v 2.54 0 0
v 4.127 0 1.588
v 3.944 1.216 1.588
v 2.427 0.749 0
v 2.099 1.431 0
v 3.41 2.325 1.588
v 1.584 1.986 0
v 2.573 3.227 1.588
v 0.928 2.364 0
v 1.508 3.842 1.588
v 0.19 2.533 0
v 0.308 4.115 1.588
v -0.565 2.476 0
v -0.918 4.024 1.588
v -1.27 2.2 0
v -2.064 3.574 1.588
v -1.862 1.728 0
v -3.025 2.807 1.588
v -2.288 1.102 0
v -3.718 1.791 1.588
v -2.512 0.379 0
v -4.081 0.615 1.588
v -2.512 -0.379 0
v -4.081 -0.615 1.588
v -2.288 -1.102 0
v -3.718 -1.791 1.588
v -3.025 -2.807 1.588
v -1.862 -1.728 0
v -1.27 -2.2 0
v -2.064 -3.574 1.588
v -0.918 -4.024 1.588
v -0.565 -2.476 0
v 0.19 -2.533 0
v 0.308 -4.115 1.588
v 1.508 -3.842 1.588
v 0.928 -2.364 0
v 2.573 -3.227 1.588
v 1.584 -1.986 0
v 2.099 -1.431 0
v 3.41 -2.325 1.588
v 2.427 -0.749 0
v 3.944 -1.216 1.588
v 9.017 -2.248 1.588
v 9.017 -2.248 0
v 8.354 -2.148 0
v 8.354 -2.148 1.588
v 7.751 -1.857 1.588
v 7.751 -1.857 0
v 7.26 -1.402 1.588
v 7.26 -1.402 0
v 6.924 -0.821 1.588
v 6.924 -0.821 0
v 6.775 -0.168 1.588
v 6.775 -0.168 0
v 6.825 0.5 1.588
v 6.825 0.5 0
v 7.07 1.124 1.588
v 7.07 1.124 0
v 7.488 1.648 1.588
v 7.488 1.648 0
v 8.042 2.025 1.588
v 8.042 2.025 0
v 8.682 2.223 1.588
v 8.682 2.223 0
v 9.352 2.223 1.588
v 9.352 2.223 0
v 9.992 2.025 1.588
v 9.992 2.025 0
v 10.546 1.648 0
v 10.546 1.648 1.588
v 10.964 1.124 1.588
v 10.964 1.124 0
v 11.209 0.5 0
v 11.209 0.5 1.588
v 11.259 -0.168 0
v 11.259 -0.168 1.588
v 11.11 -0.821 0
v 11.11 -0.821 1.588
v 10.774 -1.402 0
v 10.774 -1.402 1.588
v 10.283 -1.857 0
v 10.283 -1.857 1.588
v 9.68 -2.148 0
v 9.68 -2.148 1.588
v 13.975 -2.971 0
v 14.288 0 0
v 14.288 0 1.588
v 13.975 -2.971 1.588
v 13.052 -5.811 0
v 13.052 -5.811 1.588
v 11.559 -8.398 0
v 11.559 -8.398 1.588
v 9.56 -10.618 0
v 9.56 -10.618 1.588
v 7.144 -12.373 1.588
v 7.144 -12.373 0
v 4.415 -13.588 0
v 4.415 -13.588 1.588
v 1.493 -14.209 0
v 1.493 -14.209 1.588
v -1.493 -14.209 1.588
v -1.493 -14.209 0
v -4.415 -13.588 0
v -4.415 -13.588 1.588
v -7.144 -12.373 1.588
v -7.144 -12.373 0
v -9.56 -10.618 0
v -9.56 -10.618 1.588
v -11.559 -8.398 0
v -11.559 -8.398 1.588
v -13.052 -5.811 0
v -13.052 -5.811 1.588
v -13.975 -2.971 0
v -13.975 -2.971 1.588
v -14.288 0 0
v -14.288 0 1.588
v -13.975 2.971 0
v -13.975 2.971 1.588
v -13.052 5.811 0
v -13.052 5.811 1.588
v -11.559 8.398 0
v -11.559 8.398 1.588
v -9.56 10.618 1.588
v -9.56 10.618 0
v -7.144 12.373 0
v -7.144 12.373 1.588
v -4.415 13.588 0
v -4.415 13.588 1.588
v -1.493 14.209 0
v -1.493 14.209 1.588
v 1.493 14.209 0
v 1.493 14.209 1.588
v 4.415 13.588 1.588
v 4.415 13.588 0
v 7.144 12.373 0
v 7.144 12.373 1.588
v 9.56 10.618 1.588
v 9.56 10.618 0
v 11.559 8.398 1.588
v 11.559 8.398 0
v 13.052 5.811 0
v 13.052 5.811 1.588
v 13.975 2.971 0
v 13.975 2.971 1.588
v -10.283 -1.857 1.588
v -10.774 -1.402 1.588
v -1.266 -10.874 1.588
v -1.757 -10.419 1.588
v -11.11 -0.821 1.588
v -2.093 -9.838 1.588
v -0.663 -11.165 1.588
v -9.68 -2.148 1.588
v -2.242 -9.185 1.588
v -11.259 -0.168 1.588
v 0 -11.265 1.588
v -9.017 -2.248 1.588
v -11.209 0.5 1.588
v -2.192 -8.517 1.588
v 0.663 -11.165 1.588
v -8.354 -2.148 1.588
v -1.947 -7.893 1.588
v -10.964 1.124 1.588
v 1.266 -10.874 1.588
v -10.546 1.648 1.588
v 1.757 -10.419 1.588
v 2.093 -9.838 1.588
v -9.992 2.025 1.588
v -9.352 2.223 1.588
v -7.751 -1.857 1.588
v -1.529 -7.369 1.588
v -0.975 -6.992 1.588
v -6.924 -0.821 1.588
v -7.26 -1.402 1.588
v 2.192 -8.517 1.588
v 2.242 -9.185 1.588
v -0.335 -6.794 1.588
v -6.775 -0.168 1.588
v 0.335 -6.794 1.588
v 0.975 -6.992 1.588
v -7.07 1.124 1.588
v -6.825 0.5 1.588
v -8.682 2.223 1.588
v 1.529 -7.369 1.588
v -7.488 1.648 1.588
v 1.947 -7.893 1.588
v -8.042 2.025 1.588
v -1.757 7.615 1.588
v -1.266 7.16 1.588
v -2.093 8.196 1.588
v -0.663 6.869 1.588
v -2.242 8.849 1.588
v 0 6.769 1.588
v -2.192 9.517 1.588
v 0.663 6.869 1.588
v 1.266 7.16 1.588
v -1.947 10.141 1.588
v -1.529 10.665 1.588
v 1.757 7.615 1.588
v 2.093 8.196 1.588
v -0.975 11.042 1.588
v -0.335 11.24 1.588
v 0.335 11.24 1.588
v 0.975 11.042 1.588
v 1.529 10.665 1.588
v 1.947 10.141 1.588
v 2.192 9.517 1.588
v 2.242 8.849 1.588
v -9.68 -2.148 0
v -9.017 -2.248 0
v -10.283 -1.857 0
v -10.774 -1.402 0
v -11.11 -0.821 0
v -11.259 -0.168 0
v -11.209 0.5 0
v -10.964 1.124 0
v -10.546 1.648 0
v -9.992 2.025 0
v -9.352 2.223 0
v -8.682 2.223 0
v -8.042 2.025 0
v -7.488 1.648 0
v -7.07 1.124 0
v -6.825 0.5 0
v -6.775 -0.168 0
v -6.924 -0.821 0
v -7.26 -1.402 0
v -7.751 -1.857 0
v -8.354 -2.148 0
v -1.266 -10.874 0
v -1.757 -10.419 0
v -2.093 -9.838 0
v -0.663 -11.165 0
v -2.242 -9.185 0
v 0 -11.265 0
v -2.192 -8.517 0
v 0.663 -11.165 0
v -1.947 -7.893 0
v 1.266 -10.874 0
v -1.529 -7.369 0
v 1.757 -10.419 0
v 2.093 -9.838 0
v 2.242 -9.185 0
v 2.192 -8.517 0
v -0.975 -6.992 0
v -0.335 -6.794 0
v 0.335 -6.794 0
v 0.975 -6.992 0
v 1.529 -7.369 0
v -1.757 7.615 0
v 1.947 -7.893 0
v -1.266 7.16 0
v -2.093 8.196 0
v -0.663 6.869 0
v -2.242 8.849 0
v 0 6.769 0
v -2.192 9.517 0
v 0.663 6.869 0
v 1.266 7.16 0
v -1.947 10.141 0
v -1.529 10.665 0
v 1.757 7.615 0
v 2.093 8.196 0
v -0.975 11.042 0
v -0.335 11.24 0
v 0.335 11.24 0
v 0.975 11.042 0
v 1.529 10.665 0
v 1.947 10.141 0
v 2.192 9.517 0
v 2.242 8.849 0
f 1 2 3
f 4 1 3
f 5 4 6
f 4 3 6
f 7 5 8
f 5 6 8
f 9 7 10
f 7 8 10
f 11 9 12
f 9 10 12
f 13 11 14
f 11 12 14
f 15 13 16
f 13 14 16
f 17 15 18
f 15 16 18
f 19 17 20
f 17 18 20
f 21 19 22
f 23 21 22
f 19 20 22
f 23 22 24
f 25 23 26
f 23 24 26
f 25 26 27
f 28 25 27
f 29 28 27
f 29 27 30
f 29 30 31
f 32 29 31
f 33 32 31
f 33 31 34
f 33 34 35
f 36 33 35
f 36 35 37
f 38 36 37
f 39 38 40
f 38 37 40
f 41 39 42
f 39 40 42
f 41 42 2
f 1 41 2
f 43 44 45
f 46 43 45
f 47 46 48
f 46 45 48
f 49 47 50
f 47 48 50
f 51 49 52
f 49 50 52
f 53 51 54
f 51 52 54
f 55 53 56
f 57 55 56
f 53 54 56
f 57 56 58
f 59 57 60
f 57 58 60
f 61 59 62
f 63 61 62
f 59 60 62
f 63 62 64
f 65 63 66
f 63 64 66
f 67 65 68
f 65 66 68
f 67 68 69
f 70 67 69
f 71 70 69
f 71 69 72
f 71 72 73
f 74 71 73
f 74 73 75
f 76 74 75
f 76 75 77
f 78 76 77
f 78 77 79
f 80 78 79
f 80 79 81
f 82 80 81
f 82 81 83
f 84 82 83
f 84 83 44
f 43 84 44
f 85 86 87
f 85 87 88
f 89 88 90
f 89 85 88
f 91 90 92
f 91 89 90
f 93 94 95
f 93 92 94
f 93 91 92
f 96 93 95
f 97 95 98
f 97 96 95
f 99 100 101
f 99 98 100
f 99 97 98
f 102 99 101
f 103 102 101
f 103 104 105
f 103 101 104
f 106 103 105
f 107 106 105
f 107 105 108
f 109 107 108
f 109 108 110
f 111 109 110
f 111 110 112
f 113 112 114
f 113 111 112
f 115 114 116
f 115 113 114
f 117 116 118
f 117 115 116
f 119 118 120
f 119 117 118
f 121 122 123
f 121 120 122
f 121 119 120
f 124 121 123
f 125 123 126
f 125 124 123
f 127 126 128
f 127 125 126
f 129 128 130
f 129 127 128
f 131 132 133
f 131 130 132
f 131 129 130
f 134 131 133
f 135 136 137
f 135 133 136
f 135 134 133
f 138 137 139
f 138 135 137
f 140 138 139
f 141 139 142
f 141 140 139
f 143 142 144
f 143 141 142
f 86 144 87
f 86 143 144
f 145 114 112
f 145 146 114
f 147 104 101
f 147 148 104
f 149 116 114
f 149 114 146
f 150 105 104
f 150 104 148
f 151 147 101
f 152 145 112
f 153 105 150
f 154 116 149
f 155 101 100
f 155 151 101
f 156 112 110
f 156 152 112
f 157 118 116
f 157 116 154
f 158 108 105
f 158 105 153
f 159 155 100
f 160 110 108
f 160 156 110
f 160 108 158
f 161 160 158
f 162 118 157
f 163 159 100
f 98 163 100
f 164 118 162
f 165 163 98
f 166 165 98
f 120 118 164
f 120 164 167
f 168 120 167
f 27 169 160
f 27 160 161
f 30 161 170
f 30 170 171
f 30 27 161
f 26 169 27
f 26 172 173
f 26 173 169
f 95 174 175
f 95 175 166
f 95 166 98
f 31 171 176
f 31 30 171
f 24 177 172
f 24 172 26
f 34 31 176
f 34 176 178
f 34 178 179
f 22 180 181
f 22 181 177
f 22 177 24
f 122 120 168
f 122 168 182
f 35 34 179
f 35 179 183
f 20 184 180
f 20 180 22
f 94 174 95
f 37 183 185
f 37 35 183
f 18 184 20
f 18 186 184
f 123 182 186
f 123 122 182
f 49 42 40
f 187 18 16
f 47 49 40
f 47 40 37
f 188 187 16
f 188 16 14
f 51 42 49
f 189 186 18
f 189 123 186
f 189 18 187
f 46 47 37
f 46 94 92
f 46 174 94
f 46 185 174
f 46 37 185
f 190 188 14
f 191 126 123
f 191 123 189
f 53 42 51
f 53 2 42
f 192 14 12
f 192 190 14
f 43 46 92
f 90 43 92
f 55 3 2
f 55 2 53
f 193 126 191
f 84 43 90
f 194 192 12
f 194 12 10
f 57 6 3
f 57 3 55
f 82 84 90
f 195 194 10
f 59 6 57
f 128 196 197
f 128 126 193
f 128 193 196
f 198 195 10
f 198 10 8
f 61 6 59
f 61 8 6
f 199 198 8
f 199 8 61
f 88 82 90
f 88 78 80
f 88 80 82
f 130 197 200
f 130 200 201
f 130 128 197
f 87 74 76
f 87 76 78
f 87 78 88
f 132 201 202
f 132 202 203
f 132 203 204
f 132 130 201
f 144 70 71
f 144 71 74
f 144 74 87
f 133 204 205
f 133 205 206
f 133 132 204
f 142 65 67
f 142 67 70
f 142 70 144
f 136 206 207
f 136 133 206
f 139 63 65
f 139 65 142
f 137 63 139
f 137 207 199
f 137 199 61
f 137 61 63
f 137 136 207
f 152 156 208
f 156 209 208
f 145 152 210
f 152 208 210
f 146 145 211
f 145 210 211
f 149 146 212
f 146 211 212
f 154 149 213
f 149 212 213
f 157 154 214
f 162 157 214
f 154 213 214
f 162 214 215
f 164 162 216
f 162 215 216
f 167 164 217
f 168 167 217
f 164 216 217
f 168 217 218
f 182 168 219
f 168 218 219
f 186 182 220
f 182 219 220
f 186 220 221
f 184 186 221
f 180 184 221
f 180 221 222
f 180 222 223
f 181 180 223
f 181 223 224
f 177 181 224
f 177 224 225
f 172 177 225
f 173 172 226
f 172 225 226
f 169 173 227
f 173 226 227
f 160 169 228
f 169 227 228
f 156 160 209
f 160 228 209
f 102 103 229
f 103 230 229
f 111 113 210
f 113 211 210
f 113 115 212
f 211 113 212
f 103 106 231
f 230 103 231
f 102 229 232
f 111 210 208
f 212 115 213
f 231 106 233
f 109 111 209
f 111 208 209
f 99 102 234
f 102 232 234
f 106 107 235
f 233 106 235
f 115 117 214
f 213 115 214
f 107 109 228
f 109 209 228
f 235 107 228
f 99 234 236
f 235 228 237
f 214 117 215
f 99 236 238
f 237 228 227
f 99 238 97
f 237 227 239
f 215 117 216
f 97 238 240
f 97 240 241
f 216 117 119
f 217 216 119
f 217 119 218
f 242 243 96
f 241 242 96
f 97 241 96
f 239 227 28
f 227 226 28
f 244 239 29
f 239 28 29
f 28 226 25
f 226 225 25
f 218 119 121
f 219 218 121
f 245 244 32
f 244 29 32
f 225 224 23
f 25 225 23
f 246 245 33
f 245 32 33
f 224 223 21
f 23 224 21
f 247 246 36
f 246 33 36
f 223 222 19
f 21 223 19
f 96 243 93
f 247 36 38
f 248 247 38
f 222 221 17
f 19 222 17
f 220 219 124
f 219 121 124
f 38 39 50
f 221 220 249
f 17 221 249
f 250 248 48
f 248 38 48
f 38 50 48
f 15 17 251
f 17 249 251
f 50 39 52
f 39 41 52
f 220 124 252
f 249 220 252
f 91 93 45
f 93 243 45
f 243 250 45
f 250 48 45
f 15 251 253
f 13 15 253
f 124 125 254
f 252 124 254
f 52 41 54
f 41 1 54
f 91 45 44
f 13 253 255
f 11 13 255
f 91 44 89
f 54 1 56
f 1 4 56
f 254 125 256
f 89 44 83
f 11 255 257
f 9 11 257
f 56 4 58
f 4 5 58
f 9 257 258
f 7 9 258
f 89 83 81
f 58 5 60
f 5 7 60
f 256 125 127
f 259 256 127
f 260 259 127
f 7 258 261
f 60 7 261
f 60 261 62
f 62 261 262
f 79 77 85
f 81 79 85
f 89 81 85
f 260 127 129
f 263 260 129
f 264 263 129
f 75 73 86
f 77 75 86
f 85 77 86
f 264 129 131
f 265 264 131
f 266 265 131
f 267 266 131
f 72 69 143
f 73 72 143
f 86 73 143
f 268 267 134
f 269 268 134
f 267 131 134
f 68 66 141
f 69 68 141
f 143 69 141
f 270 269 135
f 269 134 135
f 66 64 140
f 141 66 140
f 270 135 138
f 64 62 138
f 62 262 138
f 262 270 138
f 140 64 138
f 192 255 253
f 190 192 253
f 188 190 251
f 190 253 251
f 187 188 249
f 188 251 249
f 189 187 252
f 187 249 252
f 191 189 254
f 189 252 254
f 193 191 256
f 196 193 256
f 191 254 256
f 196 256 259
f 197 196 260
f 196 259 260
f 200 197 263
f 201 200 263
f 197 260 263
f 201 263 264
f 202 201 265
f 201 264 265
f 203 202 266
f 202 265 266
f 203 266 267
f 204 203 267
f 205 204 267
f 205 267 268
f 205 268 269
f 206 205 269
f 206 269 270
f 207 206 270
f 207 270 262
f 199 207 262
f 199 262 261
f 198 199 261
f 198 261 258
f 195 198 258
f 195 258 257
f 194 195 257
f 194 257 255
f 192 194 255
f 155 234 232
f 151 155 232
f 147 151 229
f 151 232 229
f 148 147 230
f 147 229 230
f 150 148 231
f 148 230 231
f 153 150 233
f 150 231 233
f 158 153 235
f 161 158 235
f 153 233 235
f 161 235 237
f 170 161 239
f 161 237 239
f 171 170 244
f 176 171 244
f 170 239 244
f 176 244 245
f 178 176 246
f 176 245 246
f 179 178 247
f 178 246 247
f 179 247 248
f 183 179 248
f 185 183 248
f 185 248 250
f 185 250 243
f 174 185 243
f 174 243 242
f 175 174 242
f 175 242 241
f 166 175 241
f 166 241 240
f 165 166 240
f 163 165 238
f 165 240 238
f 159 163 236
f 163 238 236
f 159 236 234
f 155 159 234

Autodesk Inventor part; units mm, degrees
ref_plane "YZ Plane" through (0, 0, 0) normal (1, 0, 0) x (0, 1, 0)
ref_plane "XZ Plane" through (0, 0, 0) normal (0, 1, 0) x (-1, 0, 0)
ref_plane "XY Plane" through (0, 0, 0) normal (0, 0, 1) x (1, 0, 0)
sketch "Sketch1" plane through (0, 0, 0) normal (0, 0, 1) x (1, 0, 0)
  circle A0 centre (0, 0) radius 14.2875
  dimension "d0" = 28.575
extrude "Extrusion1" add sketch "Sketch1" along normal blind 1.5875
sketch "Sketch2" plane through (0, 0, 1.5875) normal (0, 0, 1) x (1, 0, 0)
  point P0 (0, 0)
  point P1 (0, 9.017)
  point P2 (9.017, 0)
  point P3 (0, -9.017)
  point P4 (-9.017, 0)
  dimension "d3" = 9.017
  dimension "d4" = 9.017
  dimension "d5" = 9.017
  dimension "d6" = 9.017
hole "Hole1" at (0, 9.017, 1.5875) at (9.017, 0, 1.5875) at (0, -9.017, 1.5875) at (-9.017, 0, 1.5875) direction (0, 0, -1) diameter 4.4958 depth 12.2936 tip angle 118 clearance for "Flat Head Machine Screw (82)" size "#8" standard "Ansi Unified Screw Threads"
sketch "Sketch3" plane through (0, 0, 1.5875) normal (0, 0, 1) x (1, 0, 0)
  circle A0 centre (0, 0) radius 2.54
  dimension "d14" = 5.08
extrude "Extrusion2" cut sketch "Sketch3" against normal blind 1.5875
chamfer "Chamfer1" distance 1.5875 angle 45 1 edges at (-2.54, 0, 1.5875)
properties part number "piercable_septum_clamp"
